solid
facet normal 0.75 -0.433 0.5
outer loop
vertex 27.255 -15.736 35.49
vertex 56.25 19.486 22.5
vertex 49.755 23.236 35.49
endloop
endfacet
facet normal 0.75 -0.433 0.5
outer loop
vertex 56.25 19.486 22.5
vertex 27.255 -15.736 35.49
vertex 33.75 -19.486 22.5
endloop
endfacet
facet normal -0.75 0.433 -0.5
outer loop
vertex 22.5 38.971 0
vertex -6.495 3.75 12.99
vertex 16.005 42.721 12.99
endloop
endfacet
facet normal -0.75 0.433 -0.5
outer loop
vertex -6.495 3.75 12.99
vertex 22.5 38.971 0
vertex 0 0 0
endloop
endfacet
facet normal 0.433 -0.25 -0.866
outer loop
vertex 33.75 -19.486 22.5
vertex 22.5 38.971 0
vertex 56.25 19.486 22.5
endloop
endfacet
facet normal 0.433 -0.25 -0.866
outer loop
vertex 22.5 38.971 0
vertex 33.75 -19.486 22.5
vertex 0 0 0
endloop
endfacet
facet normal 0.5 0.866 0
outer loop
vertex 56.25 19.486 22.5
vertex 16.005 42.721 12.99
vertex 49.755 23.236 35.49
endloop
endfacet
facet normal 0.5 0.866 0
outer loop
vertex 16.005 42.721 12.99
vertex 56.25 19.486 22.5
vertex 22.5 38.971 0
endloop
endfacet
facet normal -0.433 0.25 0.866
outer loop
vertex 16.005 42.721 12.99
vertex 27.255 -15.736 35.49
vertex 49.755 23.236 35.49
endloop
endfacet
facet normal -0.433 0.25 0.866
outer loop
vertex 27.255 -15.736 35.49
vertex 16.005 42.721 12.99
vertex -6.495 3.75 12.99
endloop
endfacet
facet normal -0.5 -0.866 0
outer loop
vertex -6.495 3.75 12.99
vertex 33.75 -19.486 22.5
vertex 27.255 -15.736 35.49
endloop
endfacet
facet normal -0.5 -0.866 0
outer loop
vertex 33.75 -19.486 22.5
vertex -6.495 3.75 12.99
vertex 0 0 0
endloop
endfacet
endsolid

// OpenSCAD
// Generated by generate_scads.py
rotate([60,0,60]) {
  scale([1.5,1.0,1.5]) {
    cube(size=[30,15,30], center=false);
  }
}
